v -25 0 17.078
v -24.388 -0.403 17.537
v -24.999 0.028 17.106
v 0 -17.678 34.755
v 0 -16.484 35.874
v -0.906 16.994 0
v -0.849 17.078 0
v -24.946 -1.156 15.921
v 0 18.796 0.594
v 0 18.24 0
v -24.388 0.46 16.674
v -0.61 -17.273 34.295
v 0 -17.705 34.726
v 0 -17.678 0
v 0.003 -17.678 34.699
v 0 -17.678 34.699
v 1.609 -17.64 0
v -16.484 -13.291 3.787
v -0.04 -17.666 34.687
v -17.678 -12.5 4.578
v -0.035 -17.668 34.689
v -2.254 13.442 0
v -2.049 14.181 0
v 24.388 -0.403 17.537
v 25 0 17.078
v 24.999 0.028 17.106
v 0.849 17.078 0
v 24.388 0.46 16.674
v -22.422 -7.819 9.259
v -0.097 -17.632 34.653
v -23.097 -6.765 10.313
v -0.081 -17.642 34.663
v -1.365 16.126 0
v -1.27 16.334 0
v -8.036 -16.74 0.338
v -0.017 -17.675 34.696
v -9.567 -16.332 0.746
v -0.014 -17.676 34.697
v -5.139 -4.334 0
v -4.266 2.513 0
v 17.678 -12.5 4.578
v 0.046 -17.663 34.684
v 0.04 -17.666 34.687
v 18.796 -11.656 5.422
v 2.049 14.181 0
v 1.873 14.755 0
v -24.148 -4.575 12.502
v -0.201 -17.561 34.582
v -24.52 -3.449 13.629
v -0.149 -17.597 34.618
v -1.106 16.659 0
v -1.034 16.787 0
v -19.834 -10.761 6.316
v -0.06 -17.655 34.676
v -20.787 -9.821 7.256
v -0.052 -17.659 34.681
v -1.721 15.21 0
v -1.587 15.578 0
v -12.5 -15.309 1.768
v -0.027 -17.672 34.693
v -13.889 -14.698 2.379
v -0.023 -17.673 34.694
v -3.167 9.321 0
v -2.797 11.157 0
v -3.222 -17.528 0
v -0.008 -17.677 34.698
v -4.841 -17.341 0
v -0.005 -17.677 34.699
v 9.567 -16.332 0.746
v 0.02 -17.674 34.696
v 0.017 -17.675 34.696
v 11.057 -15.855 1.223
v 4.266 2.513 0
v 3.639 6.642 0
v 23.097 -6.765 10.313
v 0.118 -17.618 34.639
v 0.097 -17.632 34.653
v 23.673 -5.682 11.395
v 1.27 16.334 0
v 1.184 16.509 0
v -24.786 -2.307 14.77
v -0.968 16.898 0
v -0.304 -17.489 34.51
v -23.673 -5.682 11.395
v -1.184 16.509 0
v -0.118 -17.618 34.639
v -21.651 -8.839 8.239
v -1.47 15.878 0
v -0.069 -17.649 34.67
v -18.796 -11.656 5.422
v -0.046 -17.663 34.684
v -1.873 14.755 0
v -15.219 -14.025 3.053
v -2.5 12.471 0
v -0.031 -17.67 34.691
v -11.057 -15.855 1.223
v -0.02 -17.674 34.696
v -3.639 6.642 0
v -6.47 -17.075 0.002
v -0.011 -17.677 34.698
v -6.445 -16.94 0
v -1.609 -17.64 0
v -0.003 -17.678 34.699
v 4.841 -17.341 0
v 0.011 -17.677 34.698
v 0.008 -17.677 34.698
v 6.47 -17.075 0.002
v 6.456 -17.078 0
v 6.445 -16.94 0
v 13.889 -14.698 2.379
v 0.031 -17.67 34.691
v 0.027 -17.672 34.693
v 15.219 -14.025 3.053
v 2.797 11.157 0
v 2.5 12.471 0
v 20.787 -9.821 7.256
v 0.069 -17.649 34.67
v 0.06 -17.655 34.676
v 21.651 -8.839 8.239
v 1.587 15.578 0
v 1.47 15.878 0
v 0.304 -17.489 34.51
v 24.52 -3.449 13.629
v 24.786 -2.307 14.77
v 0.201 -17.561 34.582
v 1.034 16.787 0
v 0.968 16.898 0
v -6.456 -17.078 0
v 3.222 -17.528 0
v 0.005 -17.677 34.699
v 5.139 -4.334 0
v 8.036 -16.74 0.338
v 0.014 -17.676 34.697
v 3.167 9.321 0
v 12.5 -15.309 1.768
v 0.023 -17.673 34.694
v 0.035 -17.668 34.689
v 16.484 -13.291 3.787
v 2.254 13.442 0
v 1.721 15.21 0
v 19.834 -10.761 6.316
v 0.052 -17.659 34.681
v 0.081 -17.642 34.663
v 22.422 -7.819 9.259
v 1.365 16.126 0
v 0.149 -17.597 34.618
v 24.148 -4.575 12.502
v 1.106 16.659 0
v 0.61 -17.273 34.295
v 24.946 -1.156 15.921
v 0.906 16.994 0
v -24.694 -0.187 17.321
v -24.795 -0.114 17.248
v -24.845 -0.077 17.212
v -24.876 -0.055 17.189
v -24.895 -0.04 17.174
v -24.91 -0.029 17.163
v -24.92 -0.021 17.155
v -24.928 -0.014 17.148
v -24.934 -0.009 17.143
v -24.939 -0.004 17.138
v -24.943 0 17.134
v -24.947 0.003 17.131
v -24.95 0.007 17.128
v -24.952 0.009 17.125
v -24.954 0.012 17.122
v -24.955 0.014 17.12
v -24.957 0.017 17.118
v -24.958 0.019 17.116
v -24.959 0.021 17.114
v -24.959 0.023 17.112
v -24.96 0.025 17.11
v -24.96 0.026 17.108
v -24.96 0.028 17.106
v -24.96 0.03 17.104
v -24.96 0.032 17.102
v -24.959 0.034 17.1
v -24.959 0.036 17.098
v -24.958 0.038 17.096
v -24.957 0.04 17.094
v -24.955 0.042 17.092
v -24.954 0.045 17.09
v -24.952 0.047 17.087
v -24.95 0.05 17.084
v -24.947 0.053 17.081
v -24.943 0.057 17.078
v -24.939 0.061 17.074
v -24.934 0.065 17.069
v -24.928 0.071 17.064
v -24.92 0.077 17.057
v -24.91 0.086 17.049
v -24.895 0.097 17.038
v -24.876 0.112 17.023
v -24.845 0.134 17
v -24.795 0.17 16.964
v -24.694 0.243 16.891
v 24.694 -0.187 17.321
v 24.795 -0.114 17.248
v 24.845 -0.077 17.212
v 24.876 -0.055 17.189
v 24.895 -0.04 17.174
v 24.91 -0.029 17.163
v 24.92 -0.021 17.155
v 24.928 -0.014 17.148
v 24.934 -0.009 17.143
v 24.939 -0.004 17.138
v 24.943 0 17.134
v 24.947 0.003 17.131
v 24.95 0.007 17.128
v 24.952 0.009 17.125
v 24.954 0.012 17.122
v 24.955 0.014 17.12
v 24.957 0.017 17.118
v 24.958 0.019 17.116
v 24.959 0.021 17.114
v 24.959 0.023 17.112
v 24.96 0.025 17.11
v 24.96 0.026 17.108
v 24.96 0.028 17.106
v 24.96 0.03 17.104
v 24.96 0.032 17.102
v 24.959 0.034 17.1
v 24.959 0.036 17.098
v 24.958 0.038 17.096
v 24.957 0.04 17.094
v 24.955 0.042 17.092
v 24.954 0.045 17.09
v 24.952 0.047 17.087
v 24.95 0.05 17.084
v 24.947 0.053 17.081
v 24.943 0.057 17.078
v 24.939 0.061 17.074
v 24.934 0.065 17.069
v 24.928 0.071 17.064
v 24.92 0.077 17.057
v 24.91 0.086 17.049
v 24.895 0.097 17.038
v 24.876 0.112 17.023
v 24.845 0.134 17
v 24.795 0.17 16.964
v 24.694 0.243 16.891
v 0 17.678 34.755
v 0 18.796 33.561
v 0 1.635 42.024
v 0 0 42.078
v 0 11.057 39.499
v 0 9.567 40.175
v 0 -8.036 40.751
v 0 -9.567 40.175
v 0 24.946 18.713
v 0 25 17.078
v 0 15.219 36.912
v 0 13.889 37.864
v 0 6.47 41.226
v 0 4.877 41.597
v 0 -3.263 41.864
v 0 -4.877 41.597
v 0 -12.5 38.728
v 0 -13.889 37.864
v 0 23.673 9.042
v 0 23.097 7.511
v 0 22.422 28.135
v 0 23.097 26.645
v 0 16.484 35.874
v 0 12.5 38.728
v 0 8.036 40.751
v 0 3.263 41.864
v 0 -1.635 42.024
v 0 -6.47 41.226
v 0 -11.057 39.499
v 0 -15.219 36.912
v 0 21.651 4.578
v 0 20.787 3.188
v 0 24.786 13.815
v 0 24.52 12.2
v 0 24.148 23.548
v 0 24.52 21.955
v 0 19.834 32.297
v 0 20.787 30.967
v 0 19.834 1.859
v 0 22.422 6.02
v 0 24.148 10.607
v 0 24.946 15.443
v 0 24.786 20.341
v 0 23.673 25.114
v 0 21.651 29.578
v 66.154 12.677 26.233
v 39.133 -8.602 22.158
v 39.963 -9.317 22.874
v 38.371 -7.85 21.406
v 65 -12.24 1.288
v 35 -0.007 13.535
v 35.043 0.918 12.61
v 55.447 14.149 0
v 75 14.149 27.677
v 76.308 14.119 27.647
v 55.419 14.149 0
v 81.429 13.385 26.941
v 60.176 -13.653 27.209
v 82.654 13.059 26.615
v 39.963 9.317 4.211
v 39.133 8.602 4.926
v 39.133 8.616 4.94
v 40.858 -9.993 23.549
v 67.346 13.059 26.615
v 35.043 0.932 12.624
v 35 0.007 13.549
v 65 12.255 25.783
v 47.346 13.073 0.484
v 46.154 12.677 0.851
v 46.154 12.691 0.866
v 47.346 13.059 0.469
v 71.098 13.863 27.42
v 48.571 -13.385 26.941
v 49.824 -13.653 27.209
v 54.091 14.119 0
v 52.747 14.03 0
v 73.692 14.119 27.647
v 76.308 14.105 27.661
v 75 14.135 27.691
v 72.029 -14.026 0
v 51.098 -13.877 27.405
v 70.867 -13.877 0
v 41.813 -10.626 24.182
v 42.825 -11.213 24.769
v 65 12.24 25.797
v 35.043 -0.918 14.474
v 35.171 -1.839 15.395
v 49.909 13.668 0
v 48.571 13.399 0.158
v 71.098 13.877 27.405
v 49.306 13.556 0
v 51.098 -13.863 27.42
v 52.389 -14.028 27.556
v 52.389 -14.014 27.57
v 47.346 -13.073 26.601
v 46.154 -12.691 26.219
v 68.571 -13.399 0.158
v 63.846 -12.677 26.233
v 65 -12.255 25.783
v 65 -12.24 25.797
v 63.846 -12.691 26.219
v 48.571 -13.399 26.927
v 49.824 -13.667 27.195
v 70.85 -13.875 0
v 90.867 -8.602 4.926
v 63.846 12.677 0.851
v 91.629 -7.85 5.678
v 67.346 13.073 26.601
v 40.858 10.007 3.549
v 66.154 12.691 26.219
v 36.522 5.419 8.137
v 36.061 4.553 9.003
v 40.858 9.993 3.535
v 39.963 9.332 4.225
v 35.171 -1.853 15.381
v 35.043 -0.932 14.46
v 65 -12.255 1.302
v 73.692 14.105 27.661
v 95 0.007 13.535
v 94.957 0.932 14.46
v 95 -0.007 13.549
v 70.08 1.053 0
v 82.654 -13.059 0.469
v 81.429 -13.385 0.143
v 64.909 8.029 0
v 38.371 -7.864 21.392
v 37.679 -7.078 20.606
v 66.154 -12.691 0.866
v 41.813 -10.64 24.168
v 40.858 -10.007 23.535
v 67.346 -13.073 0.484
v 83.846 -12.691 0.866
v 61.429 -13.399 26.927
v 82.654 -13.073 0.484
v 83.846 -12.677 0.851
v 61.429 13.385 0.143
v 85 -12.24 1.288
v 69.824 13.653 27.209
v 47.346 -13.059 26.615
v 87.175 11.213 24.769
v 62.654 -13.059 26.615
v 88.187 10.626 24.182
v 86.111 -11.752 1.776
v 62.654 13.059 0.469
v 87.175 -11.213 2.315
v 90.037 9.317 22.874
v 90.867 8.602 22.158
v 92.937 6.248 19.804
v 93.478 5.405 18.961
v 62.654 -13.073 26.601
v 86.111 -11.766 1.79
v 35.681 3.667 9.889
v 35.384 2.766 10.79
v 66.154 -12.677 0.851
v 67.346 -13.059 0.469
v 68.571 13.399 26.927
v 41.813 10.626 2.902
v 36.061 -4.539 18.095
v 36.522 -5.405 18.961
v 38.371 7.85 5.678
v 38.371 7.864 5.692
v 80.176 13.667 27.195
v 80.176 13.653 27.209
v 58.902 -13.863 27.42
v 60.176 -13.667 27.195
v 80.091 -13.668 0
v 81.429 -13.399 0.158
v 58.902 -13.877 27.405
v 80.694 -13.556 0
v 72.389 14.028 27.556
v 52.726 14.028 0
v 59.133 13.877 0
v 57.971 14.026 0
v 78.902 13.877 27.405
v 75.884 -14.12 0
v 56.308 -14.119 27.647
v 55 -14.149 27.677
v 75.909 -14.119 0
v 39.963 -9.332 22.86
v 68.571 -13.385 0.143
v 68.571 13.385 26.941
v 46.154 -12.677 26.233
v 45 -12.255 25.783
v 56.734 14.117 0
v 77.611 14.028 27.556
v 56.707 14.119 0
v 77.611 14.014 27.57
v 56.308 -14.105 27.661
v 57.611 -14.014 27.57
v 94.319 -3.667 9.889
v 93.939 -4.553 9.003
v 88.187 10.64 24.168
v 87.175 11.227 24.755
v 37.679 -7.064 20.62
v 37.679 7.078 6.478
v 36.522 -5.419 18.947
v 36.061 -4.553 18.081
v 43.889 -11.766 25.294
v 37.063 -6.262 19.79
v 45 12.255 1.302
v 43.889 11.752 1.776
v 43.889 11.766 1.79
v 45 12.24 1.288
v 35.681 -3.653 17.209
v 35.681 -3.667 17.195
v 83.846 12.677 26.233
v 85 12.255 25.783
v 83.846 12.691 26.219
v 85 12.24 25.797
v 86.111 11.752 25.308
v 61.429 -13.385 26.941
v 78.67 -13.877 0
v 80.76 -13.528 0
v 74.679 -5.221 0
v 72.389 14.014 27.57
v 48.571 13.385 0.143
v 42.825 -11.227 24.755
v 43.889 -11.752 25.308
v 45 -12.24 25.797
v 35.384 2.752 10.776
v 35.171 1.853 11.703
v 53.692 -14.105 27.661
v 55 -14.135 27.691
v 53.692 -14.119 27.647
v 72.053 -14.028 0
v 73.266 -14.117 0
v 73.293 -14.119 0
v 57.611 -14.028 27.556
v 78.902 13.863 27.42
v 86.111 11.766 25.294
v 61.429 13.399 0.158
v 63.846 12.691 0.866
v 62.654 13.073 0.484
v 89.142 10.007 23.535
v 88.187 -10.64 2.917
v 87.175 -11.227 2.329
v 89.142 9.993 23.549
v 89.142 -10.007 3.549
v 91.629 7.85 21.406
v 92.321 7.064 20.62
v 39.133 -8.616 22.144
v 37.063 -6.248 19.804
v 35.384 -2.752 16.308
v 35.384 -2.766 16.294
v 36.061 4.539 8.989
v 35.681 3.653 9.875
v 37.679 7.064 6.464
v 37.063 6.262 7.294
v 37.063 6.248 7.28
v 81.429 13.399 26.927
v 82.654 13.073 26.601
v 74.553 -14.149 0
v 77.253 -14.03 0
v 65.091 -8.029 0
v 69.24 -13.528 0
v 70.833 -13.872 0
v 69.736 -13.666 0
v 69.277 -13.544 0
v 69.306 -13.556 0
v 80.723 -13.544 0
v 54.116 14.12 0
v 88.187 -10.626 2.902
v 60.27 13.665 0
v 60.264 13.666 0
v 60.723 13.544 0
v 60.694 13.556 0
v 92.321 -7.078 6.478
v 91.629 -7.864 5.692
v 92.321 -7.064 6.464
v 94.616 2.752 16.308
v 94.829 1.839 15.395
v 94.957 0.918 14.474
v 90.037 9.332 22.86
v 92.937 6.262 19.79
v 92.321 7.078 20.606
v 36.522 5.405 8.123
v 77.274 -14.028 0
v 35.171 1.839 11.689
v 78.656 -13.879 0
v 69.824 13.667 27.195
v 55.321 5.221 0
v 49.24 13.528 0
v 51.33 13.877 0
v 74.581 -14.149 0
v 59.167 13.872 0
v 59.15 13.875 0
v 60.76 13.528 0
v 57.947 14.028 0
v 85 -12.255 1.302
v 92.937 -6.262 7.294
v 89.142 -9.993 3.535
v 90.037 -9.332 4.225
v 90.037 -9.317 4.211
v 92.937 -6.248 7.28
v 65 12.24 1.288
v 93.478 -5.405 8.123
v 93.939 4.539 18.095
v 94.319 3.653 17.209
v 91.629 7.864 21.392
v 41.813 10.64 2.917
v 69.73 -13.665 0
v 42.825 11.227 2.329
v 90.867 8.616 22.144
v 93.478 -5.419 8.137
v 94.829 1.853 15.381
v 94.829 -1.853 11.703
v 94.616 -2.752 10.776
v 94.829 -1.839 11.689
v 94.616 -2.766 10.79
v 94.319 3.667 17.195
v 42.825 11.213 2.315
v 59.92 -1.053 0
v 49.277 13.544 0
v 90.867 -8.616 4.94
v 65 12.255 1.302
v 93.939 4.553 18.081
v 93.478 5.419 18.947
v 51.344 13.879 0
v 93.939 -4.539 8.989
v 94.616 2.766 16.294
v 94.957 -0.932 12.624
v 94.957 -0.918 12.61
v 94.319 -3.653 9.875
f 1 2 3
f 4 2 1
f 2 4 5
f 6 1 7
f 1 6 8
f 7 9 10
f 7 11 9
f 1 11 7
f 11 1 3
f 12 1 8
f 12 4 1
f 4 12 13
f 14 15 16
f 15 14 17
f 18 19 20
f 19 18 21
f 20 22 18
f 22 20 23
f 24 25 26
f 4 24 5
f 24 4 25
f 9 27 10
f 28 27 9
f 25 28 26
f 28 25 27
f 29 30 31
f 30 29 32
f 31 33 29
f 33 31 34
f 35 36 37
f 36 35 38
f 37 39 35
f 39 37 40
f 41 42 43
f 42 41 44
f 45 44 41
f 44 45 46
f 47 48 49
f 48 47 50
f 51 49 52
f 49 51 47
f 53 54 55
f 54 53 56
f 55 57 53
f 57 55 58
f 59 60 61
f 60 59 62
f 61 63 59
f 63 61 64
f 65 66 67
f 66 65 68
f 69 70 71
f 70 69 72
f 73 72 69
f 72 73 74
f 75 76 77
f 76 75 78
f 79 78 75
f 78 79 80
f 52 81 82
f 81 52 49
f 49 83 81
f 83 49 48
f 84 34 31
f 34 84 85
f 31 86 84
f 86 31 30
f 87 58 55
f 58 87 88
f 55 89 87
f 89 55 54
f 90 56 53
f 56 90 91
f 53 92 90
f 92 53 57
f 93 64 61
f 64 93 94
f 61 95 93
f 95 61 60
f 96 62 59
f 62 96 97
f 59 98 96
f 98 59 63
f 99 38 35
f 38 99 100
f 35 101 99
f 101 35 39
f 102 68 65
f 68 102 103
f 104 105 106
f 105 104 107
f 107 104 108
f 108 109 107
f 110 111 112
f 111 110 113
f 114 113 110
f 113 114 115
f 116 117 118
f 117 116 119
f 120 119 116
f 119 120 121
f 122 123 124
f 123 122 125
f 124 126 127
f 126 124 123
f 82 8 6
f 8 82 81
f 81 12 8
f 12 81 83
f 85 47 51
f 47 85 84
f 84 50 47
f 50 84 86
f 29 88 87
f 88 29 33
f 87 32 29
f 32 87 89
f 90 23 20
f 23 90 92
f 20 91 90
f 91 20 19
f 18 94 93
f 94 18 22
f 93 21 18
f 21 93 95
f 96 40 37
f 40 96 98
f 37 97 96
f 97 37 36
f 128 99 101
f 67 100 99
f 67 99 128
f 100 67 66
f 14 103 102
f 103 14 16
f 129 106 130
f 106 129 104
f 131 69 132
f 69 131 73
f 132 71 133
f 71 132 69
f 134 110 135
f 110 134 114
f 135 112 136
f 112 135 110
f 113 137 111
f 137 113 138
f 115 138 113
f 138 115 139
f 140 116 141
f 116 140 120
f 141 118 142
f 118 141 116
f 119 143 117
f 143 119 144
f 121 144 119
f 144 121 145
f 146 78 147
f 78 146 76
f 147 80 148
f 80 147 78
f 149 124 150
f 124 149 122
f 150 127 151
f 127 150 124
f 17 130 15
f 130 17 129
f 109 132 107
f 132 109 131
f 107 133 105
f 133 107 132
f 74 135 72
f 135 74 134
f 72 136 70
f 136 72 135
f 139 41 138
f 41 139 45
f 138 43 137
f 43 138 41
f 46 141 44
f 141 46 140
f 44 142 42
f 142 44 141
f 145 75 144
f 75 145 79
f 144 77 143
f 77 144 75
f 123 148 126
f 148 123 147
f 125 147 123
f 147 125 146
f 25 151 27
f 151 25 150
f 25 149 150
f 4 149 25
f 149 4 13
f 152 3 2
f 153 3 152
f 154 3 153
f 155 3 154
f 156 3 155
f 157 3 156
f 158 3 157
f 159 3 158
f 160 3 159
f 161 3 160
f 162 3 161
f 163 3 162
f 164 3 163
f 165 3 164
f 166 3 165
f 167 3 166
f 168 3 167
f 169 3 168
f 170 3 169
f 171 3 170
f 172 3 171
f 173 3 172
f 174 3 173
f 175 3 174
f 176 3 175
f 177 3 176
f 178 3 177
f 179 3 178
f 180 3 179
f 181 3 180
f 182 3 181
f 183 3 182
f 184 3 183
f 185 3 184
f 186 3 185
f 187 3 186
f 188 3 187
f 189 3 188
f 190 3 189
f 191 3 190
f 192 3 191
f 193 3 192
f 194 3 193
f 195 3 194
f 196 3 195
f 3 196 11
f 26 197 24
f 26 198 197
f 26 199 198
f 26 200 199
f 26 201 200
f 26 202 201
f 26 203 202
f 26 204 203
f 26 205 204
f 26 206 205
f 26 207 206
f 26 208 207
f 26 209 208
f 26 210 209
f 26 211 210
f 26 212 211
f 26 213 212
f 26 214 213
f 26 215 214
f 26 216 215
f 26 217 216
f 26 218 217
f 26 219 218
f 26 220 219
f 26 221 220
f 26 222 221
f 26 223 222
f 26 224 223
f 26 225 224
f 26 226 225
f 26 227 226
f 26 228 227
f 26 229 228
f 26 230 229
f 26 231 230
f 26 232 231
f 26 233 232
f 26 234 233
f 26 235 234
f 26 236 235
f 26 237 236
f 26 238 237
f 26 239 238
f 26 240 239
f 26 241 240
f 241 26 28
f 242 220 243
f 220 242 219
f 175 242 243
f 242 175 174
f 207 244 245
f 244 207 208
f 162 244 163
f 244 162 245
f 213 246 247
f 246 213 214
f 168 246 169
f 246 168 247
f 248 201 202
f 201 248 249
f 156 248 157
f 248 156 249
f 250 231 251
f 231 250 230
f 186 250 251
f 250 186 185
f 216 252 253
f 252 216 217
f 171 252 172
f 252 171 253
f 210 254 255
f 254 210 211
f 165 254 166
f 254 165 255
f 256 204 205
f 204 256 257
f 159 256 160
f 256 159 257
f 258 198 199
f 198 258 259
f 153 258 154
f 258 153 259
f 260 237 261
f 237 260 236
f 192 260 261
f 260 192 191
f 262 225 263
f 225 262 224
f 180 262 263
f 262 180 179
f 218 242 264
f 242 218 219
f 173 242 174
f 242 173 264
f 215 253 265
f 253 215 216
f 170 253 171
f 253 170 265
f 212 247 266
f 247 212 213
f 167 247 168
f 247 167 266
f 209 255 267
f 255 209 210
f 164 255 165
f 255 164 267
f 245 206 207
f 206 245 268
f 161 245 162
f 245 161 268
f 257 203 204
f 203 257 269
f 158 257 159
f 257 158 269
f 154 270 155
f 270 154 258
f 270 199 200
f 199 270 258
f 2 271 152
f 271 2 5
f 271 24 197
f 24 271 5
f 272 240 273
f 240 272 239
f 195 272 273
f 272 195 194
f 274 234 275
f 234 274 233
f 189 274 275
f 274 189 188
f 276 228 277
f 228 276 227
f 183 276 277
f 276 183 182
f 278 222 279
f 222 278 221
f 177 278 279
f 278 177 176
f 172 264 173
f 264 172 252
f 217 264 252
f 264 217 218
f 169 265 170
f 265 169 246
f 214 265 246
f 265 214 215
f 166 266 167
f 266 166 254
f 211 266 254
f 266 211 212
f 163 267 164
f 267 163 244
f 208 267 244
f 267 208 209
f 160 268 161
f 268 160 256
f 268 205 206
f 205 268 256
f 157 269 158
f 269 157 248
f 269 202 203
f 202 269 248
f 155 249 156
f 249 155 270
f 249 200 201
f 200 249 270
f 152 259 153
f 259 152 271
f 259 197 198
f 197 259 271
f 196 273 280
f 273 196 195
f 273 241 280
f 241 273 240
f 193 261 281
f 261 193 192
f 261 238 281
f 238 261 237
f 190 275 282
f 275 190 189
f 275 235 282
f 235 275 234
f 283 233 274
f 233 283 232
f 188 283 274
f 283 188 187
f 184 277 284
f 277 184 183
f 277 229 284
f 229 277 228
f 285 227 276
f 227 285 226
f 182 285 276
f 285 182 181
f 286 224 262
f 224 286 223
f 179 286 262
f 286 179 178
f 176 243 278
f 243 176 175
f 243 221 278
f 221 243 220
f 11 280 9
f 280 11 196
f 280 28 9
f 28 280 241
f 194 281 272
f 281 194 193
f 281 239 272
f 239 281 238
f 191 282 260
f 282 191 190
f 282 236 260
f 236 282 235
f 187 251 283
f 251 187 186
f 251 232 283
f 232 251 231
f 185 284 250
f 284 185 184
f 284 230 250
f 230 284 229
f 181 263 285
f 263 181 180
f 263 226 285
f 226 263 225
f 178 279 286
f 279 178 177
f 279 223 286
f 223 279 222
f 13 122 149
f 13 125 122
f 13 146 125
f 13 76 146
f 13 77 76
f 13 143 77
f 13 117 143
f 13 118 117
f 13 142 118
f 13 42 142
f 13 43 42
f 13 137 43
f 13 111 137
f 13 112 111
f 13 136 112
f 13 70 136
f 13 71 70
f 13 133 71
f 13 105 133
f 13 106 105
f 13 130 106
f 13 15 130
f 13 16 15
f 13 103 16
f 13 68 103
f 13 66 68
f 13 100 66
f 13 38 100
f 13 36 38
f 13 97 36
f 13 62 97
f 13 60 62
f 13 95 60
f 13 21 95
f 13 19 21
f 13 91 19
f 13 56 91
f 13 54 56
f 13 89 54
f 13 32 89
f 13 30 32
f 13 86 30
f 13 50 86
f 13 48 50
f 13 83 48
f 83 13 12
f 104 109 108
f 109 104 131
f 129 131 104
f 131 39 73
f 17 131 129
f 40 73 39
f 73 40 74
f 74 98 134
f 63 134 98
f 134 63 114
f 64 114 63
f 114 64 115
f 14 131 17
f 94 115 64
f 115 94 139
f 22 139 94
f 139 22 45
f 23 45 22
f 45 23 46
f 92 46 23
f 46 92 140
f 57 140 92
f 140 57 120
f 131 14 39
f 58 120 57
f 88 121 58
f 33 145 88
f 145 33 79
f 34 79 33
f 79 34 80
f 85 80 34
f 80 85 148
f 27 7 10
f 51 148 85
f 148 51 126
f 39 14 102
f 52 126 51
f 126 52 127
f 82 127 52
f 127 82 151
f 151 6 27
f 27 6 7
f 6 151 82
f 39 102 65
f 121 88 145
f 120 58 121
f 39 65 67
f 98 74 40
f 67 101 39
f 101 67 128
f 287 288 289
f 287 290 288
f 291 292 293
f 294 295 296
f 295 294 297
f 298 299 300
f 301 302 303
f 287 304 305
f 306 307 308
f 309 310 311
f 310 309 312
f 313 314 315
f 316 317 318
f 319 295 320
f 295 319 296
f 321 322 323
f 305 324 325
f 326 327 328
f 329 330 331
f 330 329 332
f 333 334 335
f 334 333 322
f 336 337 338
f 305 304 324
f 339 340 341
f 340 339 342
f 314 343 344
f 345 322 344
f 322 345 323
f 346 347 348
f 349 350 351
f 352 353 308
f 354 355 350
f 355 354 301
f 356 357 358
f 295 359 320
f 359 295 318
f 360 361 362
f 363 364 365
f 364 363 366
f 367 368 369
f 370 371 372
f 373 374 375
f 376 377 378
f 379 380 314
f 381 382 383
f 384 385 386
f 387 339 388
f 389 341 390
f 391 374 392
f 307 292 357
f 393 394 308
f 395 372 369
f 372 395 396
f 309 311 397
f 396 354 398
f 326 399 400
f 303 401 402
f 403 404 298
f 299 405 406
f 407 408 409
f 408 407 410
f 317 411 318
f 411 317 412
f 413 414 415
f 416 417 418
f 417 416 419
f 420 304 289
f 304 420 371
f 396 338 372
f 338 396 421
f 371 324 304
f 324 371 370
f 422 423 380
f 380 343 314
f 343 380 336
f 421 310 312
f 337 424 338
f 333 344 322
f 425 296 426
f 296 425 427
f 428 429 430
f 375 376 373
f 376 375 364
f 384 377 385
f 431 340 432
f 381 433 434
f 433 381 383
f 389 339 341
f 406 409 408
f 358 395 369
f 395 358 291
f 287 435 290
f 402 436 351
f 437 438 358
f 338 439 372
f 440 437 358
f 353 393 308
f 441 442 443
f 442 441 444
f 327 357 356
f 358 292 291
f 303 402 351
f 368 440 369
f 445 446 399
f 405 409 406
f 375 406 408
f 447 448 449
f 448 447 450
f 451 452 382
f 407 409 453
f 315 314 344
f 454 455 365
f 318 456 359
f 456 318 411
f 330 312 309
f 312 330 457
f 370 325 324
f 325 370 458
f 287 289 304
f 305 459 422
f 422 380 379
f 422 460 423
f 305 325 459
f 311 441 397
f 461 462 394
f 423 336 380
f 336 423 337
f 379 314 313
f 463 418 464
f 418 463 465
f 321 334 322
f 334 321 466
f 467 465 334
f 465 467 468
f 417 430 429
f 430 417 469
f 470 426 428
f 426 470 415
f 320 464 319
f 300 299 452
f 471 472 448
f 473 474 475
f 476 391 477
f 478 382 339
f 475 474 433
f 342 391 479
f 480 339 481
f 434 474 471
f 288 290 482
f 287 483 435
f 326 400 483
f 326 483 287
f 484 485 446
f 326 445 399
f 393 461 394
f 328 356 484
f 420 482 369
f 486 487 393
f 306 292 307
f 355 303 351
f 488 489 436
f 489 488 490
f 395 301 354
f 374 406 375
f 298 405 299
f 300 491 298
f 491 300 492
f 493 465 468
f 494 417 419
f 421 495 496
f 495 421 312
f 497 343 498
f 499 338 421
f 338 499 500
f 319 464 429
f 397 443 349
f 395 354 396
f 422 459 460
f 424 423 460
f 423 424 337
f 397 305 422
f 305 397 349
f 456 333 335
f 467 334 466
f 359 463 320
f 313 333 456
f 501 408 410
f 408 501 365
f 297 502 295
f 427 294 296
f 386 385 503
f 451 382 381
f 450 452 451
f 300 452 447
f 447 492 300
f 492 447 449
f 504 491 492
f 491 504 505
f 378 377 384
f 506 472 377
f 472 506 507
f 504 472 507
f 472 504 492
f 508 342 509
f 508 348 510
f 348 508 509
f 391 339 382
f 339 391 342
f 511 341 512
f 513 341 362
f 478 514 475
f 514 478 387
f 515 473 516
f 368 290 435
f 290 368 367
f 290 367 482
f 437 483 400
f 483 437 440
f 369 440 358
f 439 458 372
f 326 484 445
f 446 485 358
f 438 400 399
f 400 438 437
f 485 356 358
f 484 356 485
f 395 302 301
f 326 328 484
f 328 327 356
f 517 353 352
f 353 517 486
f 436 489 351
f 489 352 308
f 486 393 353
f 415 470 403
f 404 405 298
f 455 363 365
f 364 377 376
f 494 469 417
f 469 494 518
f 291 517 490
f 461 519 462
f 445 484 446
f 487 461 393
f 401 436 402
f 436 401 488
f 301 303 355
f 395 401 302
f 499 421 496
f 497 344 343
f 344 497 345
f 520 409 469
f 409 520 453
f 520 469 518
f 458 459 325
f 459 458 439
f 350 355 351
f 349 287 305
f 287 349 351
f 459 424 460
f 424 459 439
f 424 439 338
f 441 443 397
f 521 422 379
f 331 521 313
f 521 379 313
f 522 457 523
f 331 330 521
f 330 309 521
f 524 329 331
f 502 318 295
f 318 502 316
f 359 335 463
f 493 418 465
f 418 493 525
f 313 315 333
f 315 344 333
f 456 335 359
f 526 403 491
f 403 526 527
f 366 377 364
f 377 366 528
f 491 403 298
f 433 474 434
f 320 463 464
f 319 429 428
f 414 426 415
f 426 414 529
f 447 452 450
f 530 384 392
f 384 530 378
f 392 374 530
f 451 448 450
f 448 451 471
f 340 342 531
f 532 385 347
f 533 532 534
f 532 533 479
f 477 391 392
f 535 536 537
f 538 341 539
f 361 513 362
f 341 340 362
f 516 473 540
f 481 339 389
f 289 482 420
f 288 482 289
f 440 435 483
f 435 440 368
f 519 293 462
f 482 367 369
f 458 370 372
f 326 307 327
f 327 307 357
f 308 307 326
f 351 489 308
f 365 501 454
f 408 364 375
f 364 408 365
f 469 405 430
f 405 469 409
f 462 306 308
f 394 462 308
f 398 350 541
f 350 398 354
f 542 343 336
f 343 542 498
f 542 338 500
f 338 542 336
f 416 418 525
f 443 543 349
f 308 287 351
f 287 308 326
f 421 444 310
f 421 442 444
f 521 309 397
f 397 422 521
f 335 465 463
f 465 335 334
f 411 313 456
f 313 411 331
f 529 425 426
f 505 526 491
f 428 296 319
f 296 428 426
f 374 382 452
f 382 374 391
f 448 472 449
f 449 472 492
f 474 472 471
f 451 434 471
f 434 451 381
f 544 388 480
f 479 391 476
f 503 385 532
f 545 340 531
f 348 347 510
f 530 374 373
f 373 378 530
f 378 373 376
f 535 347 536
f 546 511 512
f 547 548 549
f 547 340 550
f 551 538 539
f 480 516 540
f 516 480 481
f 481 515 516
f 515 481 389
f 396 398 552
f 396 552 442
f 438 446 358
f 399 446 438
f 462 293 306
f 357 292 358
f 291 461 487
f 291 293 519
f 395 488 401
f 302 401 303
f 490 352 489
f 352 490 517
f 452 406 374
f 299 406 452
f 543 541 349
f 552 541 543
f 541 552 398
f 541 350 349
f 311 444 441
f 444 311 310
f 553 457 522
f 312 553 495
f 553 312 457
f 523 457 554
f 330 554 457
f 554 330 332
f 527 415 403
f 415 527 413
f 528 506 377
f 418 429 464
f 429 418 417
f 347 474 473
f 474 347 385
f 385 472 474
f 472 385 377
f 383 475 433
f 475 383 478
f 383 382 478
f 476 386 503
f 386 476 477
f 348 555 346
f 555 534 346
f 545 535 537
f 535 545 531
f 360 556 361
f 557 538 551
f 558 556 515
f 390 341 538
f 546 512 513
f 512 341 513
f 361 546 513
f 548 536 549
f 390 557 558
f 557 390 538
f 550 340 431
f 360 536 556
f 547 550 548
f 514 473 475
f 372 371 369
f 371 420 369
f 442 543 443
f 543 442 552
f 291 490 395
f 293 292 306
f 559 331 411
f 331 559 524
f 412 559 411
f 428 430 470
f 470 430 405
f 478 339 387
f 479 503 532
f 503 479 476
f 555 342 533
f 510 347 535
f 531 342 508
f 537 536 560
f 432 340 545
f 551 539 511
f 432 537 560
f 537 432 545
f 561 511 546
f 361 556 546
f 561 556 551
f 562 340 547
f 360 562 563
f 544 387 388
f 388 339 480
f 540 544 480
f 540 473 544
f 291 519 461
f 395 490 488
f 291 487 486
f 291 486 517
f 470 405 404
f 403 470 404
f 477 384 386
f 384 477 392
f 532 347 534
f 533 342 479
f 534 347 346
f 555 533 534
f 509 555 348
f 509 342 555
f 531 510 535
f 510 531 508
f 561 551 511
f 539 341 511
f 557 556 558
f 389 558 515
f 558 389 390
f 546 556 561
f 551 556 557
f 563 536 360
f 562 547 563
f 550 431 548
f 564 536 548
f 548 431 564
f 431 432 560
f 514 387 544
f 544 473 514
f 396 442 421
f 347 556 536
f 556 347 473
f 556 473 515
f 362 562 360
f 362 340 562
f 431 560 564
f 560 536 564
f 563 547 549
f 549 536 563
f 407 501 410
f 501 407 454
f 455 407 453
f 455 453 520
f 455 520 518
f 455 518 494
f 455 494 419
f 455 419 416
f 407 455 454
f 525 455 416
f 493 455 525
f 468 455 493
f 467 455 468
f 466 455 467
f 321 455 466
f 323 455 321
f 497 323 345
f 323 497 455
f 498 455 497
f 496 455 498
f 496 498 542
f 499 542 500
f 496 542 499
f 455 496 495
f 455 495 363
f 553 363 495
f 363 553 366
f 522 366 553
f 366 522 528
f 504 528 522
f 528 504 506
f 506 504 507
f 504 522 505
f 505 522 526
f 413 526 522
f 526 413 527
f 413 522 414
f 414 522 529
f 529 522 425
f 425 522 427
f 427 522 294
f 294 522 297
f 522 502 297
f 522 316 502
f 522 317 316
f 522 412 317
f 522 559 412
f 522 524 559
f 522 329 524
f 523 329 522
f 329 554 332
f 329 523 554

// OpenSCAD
// @name Sphericon Rollers
// @description A pair of developable desk rollers: the classic sphericon (a split-and-twisted bicone that meanders in a straight-ish wobble) and an oloid (the convex hull of two perpendicular circles).
// @tags toy, fidget, sphericon, oloid, roller, mathematical, desk
//
// Two single-piece rolling solids whose entire surface touches the
// table as they roll (developable rollers):
//
// SPHERICON - exact construction:
//   1. Revolve a right isosceles triangle [[0,-R],[R,0],[0,R]] about
//      the z axis (rotate_extrude) -> a bicone with 90-degree apices
//      (equator radius R = half-height R). Its axial cross-section is
//      a square of diagonal 2R standing on a corner.
//   2. Split the bicone in half along a plane containing the axis
//      (the y=0 plane). The cut face is exactly that square.
//   3. Rotate one half by 90 degrees about the cut face's normal-space
//      diagonal (rotate([0,90,0]) maps the square's corners
//      (R,0,0)->(0,0,-R)->(-R,0,0)->(0,0,R) onto each other).
//   4. Rejoin. The two halves are welded with a 0.04mm overlap slab at
//      the seam so the union is a single manifold body rather than two
//      face-coincident shells.
//   Rolling property: each cone's slant surface makes 45 degrees with
//   its axis, so resting on any surface line the center sits at height
//   R*sin(45) = R/sqrt(2) - constant while it rolls (verified by
//   mesh centroid measurement in the repo's audit harness).
//
// OLOID - exact construction: convex hull of two circles of radius r
//   in perpendicular planes, each passing through the other's center
//   (centers r apart). Modeled as hull() of two 0.02mm-thin discs -
//   the hull of a disc equals the hull of its boundary circle, so this
//   is the standard oloid definition verbatim. It rolls developably
//   with a rhythmic wobble (its center height is NOT constant - that
//   is the charm; only the sphericon has the constant-height property).
//
// Print orientation (both modes pose the parts this way, min z = 0):
//   Each roller rests on its rolling contact - a straight line segment
//   (sphericon: a cone slant line; oloid: the symmetric two-point
//   pose with the center of mass directly above the midpoint). A flat
//   micro-facet (facet_depth, set 0 to disable) is shaved off at z=0
//   to turn the line contact into a real adhesion patch, exactly like
//   printing a lying cylinder with a small flat. The first ~1mm above
//   the facet locally exceeds 45 degrees but each layer overhangs the
//   last by well under a perimeter width (large radius of curvature,
//   developable surface) - self-supporting; use a brim, no supports.

/* [Sphericon] */
// Bicone equator radius (mm) - the sphericon spans 2x this
sphericon_radius = 25; // [15:1:35]

/* [Oloid] */
// Generating circle radius (mm) - the oloid is 3x this long
oloid_radius = 20; // [12:1:30]

/* [Printing] */
// Depth of the flat resting facet for bed adhesion (mm, 0 = knife-edge)
facet_depth = 0.6; // [0:0.2:2]

/* [Display] */
// What to show
_display_mode = "set"; // ["set", "sphericon", "oloid"]

/* [Advanced] */
$fn = 96;

// ---- Asserts ----

assert(facet_depth < sphericon_radius / 6 && facet_depth < oloid_radius / 6,
    str("facet_depth ", facet_depth, " would truncate the rollers - keep it under ",
        min(sphericon_radius, oloid_radius) / 6));

// ---- Accessors (used by the verification harness) ----

function sphericon_R() = sphericon_radius;
function oloid_R() = oloid_radius;
// Constant rolling height of the sphericon's center
function sphericon_rest_h() = sphericon_radius / sqrt(2);
// Height of the oloid center in the symmetric two-point rest pose
function oloid_rest_h() = oloid_radius / sqrt(2);
// Analytic bicone volume (= sphericon volume: the halves are rearranged)
function sphericon_volume() = 2 / 3 * PI * pow(sphericon_radius, 3);

// ---- Construction ----

// Bicone: right isosceles triangle revolved about z.
// Apices (0,0,+/-R), equator radius R at z=0.
module bicone(R) {
    rotate_extrude()
        polygon([[0, -R], [R, 0], [0, R]]);
}

// Sphericon in its construction frame (centered on the origin):
// half A = y<=0 half of the bicone (axis z), half B = y>=0 half
// rotated 90 degrees about y. Each half is cut 0.04mm past the y=0
// plane so they overlap and weld into one manifold body.
module sphericon_raw(R) {
    w = 0.04;
    big = 4 * R;
    union() {
        intersection() {
            bicone(R);
            translate([0, -big / 2 + w, 0]) cube(big, center = true);
        }
        rotate([0, 90, 0]) intersection() {
            bicone(R);
            translate([0, big / 2 - w, 0]) cube(big, center = true);
        }
    }
}

// Oloid in its construction frame: hull of a radius-r circle in the
// y=0 plane centered (-r/2,0,0) and one in the z=0 plane centered
// (+r/2,0,0). Perpendicular planes, centers r apart: each circle
// passes through the other's center.
module oloid_raw(r) {
    hull() {
        translate([-r / 2, 0, 0])
            rotate([90, 0, 0]) cylinder(h = 0.02, r = r, center = true);
        translate([r / 2, 0, 0])
            cylinder(h = 0.02, r = r, center = true);
    }
}

// Pose a child resting on z=0 given its centered rest height, shaving
// the facet off below z=0 (guarded: no degenerate cut when depth = 0)
module rest_on_plate(rest_h, depth) {
    if (depth > 0) {
        difference() {
            translate([0, 0, rest_h - depth]) children();
            translate([0, 0, -50]) cube([500, 500, 100], center = true);
        }
    } else {
        translate([0, 0, rest_h]) children();
    }
}

// Sphericon posed on its resting line: rotate([45,0,0]) lays the
// half-A lower-cone slant line (apex (0,0,-R) to equator (0,-R,0),
// mid-azimuth of the un-twisted half) horizontal along y at
// z = -R/sqrt(2); the line contact becomes the facet.
module sphericon_posed() {
    rest_on_plate(sphericon_rest_h(), facet_depth)
        rotate([45, 0, 0]) sphericon_raw(sphericon_radius);
}

// Oloid posed in its symmetric rest: rotate([45,0,0]) puts the
// oloid's 2-fold symmetry axis (x=0, y=z) vertical, leaving two
// diagonal lowest points at z = -r/sqrt(2) - circle A's bottom
// (-r/2, 0, -r) and circle B's point (r/2, -r, 0) - with the center
// of mass (the origin, by symmetry) directly above their midpoint.
module oloid_posed() {
    rest_on_plate(oloid_rest_h(), facet_depth)
        rotate([45, 0, 0]) oloid_raw(oloid_radius);
}

// ---- Display ----

// Set layout: x extents are +/-sphericon_radius and +/-1.5*oloid_radius
// (the posing rotations are about x, so x extents are unchanged)
_oloid_x = sphericon_radius + 1.5 * oloid_radius + 10;

if (_display_mode == "set") {
    color("Gold") sphericon_posed();
    color("DodgerBlue") translate([_oloid_x, 0, 0]) oloid_posed();
} else if (_display_mode == "sphericon") {
    color("Gold") sphericon_posed();
} else if (_display_mode == "oloid") {
    color("DodgerBlue") oloid_posed();
}
